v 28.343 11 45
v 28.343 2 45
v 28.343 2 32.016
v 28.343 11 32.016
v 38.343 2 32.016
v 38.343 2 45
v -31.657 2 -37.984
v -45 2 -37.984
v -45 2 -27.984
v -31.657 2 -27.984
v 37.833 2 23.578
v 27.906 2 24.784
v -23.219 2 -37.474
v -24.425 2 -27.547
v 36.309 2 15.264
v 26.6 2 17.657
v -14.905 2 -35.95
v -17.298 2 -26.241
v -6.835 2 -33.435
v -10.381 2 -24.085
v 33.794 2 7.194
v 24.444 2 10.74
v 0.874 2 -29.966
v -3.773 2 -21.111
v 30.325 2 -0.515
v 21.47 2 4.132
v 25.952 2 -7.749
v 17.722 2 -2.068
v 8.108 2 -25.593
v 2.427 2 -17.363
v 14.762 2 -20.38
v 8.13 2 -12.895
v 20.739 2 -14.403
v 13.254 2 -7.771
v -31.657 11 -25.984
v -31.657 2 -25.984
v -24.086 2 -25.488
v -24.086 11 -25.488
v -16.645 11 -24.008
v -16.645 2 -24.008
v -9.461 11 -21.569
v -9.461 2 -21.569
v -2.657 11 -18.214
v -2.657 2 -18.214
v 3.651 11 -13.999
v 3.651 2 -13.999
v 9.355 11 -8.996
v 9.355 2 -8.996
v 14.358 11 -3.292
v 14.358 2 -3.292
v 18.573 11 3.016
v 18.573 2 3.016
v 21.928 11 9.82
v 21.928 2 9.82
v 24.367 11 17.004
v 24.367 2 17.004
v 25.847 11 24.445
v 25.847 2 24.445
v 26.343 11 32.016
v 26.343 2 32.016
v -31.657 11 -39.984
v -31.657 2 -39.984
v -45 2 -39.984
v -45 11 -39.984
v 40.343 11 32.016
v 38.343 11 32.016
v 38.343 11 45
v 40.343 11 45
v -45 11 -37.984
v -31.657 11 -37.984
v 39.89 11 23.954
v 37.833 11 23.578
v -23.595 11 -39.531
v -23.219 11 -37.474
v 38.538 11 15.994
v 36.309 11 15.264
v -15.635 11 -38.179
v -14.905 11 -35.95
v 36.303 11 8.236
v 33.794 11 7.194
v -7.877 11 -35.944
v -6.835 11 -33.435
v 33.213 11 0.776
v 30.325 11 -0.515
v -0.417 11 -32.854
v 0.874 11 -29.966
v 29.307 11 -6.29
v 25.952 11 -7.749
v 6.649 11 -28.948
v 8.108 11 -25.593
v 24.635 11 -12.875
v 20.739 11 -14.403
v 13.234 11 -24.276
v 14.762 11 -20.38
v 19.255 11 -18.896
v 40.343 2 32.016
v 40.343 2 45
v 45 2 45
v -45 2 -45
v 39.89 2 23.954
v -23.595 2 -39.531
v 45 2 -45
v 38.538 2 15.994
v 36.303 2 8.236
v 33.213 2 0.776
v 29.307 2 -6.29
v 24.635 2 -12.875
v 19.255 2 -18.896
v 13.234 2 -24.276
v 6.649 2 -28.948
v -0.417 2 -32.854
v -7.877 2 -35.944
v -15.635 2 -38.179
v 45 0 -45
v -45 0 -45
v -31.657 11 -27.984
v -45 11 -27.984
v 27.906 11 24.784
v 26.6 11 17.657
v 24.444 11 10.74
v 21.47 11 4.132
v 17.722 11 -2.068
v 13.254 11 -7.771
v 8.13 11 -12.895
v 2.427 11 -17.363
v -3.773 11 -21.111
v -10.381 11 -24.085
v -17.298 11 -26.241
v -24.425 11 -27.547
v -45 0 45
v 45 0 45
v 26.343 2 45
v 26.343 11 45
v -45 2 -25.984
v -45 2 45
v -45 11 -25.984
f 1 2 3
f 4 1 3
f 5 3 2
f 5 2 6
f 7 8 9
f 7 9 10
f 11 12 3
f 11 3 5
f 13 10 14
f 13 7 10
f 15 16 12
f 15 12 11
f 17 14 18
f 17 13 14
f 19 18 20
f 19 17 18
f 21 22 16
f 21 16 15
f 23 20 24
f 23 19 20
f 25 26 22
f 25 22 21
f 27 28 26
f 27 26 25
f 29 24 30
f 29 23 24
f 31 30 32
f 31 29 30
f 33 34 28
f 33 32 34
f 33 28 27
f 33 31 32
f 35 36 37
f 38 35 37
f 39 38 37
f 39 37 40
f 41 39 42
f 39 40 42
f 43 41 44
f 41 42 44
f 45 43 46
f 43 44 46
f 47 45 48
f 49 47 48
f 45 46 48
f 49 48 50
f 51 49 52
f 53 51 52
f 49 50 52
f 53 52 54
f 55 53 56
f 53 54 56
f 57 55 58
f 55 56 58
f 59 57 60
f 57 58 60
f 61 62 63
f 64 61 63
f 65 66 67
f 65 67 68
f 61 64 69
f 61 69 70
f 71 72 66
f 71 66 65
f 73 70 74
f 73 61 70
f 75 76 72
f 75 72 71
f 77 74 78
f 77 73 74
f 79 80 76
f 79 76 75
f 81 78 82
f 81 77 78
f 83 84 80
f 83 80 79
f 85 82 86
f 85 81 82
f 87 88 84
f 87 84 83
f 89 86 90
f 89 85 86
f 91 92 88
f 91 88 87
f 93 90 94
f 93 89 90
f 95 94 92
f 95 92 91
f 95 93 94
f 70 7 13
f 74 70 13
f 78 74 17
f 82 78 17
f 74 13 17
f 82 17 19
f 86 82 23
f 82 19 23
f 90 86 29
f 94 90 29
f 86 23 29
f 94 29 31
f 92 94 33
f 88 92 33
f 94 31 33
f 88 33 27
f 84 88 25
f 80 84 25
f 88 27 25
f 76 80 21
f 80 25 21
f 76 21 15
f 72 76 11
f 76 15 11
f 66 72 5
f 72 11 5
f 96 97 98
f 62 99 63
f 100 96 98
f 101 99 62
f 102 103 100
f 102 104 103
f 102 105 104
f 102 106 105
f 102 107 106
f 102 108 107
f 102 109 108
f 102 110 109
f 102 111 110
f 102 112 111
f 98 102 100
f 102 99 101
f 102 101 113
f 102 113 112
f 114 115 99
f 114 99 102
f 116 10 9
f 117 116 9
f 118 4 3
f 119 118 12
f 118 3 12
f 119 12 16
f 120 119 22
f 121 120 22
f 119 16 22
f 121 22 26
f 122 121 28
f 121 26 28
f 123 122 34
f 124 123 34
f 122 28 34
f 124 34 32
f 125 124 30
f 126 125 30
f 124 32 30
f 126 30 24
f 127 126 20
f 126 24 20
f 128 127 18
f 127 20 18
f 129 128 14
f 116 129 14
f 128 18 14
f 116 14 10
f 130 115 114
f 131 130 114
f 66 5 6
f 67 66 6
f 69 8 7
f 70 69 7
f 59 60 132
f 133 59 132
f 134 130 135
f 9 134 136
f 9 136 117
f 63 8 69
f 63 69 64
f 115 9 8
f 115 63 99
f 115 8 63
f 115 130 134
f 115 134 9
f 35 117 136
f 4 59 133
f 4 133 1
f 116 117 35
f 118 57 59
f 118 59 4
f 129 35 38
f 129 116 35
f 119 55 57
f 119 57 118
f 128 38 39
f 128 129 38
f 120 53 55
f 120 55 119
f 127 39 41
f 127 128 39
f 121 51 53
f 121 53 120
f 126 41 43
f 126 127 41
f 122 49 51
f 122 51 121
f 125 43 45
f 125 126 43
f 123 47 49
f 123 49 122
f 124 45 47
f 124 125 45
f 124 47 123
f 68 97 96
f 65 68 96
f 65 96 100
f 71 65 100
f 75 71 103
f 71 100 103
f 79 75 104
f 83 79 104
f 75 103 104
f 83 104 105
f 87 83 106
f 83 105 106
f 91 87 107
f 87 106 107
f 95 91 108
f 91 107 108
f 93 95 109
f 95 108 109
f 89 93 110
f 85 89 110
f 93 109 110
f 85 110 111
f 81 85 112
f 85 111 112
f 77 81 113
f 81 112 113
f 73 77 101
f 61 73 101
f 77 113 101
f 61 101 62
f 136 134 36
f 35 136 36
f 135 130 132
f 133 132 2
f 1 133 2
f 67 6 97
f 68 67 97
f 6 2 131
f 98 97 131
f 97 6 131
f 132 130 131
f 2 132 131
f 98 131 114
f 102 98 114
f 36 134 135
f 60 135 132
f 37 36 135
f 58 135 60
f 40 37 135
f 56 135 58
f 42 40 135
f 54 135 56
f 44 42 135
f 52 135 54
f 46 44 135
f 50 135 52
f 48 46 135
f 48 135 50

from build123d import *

# Parameters (mm, degrees)
SKETCH_1_W      = 90
SKETCH_1_H      = 90
EXTRUDE_1_DEPTH = 2
EXTRUDE_5_DEPTH = 9


with BuildPart() as part:
    # 草图1 → 凸台-拉伸1 (new body)
    with BuildSketch(Plane(origin=(0, 0, 0), x_dir=(1, 0, 0), z_dir=(0, 1, 0))):
        Rectangle(SKETCH_1_W, SKETCH_1_H)
    extrude(amount=EXTRUDE_1_DEPTH)

    # 草图2 → 拉伸-薄壁5 (add)
    with BuildSketch(Plane(origin=(0, 2, 0), x_dir=(1, 0, 0), z_dir=(0, 1, 0))):
        with BuildLine():
            Line((40.343110101, -45), (40.343110101, -32.015885558))
            ThreePointArc((40.343110101, -32.015885558), (19.254798346, 18.895802688), (-31.656889899, 39.984114442))
            Line((-31.656889899, 39.984114442), (-45, 39.984114442))
            Line((-45, 39.984114442), (-45, 37.984114442))
            Line((-45, 37.984114442), (-31.656889899, 37.984114442))
            ThreePointArc((-31.656889899, 37.984114442), (17.840584784, 17.481589125), (38.343110101, -32.015885558))
            Line((38.343110101, -32.015885558), (38.343110101, -45))
            Line((38.343110101, -45), (40.343110101, -45))
        make_face()
        with BuildLine():
            Line((28.343110101, -45), (28.343110101, -32.015885558))
            ThreePointArc((28.343110101, -32.015885558), (10.769516972, 10.410521313), (-31.656889899, 27.984114442))
            Line((-31.656889899, 27.984114442), (-45, 27.984114442))
            Line((-45, 27.984114442), (-45, 25.984114442))
            Line((-45, 25.984114442), (-31.656889899, 25.984114442))
            ThreePointArc((-31.656889899, 25.984114442), (9.35530341, 8.996307751), (26.343110101, -32.015885558))
            Line((26.343110101, -32.015885558), (26.343110101, -45))
            Line((26.343110101, -45), (28.343110101, -45))
        make_face()
    extrude(amount=EXTRUDE_5_DEPTH)


solid = part.part
